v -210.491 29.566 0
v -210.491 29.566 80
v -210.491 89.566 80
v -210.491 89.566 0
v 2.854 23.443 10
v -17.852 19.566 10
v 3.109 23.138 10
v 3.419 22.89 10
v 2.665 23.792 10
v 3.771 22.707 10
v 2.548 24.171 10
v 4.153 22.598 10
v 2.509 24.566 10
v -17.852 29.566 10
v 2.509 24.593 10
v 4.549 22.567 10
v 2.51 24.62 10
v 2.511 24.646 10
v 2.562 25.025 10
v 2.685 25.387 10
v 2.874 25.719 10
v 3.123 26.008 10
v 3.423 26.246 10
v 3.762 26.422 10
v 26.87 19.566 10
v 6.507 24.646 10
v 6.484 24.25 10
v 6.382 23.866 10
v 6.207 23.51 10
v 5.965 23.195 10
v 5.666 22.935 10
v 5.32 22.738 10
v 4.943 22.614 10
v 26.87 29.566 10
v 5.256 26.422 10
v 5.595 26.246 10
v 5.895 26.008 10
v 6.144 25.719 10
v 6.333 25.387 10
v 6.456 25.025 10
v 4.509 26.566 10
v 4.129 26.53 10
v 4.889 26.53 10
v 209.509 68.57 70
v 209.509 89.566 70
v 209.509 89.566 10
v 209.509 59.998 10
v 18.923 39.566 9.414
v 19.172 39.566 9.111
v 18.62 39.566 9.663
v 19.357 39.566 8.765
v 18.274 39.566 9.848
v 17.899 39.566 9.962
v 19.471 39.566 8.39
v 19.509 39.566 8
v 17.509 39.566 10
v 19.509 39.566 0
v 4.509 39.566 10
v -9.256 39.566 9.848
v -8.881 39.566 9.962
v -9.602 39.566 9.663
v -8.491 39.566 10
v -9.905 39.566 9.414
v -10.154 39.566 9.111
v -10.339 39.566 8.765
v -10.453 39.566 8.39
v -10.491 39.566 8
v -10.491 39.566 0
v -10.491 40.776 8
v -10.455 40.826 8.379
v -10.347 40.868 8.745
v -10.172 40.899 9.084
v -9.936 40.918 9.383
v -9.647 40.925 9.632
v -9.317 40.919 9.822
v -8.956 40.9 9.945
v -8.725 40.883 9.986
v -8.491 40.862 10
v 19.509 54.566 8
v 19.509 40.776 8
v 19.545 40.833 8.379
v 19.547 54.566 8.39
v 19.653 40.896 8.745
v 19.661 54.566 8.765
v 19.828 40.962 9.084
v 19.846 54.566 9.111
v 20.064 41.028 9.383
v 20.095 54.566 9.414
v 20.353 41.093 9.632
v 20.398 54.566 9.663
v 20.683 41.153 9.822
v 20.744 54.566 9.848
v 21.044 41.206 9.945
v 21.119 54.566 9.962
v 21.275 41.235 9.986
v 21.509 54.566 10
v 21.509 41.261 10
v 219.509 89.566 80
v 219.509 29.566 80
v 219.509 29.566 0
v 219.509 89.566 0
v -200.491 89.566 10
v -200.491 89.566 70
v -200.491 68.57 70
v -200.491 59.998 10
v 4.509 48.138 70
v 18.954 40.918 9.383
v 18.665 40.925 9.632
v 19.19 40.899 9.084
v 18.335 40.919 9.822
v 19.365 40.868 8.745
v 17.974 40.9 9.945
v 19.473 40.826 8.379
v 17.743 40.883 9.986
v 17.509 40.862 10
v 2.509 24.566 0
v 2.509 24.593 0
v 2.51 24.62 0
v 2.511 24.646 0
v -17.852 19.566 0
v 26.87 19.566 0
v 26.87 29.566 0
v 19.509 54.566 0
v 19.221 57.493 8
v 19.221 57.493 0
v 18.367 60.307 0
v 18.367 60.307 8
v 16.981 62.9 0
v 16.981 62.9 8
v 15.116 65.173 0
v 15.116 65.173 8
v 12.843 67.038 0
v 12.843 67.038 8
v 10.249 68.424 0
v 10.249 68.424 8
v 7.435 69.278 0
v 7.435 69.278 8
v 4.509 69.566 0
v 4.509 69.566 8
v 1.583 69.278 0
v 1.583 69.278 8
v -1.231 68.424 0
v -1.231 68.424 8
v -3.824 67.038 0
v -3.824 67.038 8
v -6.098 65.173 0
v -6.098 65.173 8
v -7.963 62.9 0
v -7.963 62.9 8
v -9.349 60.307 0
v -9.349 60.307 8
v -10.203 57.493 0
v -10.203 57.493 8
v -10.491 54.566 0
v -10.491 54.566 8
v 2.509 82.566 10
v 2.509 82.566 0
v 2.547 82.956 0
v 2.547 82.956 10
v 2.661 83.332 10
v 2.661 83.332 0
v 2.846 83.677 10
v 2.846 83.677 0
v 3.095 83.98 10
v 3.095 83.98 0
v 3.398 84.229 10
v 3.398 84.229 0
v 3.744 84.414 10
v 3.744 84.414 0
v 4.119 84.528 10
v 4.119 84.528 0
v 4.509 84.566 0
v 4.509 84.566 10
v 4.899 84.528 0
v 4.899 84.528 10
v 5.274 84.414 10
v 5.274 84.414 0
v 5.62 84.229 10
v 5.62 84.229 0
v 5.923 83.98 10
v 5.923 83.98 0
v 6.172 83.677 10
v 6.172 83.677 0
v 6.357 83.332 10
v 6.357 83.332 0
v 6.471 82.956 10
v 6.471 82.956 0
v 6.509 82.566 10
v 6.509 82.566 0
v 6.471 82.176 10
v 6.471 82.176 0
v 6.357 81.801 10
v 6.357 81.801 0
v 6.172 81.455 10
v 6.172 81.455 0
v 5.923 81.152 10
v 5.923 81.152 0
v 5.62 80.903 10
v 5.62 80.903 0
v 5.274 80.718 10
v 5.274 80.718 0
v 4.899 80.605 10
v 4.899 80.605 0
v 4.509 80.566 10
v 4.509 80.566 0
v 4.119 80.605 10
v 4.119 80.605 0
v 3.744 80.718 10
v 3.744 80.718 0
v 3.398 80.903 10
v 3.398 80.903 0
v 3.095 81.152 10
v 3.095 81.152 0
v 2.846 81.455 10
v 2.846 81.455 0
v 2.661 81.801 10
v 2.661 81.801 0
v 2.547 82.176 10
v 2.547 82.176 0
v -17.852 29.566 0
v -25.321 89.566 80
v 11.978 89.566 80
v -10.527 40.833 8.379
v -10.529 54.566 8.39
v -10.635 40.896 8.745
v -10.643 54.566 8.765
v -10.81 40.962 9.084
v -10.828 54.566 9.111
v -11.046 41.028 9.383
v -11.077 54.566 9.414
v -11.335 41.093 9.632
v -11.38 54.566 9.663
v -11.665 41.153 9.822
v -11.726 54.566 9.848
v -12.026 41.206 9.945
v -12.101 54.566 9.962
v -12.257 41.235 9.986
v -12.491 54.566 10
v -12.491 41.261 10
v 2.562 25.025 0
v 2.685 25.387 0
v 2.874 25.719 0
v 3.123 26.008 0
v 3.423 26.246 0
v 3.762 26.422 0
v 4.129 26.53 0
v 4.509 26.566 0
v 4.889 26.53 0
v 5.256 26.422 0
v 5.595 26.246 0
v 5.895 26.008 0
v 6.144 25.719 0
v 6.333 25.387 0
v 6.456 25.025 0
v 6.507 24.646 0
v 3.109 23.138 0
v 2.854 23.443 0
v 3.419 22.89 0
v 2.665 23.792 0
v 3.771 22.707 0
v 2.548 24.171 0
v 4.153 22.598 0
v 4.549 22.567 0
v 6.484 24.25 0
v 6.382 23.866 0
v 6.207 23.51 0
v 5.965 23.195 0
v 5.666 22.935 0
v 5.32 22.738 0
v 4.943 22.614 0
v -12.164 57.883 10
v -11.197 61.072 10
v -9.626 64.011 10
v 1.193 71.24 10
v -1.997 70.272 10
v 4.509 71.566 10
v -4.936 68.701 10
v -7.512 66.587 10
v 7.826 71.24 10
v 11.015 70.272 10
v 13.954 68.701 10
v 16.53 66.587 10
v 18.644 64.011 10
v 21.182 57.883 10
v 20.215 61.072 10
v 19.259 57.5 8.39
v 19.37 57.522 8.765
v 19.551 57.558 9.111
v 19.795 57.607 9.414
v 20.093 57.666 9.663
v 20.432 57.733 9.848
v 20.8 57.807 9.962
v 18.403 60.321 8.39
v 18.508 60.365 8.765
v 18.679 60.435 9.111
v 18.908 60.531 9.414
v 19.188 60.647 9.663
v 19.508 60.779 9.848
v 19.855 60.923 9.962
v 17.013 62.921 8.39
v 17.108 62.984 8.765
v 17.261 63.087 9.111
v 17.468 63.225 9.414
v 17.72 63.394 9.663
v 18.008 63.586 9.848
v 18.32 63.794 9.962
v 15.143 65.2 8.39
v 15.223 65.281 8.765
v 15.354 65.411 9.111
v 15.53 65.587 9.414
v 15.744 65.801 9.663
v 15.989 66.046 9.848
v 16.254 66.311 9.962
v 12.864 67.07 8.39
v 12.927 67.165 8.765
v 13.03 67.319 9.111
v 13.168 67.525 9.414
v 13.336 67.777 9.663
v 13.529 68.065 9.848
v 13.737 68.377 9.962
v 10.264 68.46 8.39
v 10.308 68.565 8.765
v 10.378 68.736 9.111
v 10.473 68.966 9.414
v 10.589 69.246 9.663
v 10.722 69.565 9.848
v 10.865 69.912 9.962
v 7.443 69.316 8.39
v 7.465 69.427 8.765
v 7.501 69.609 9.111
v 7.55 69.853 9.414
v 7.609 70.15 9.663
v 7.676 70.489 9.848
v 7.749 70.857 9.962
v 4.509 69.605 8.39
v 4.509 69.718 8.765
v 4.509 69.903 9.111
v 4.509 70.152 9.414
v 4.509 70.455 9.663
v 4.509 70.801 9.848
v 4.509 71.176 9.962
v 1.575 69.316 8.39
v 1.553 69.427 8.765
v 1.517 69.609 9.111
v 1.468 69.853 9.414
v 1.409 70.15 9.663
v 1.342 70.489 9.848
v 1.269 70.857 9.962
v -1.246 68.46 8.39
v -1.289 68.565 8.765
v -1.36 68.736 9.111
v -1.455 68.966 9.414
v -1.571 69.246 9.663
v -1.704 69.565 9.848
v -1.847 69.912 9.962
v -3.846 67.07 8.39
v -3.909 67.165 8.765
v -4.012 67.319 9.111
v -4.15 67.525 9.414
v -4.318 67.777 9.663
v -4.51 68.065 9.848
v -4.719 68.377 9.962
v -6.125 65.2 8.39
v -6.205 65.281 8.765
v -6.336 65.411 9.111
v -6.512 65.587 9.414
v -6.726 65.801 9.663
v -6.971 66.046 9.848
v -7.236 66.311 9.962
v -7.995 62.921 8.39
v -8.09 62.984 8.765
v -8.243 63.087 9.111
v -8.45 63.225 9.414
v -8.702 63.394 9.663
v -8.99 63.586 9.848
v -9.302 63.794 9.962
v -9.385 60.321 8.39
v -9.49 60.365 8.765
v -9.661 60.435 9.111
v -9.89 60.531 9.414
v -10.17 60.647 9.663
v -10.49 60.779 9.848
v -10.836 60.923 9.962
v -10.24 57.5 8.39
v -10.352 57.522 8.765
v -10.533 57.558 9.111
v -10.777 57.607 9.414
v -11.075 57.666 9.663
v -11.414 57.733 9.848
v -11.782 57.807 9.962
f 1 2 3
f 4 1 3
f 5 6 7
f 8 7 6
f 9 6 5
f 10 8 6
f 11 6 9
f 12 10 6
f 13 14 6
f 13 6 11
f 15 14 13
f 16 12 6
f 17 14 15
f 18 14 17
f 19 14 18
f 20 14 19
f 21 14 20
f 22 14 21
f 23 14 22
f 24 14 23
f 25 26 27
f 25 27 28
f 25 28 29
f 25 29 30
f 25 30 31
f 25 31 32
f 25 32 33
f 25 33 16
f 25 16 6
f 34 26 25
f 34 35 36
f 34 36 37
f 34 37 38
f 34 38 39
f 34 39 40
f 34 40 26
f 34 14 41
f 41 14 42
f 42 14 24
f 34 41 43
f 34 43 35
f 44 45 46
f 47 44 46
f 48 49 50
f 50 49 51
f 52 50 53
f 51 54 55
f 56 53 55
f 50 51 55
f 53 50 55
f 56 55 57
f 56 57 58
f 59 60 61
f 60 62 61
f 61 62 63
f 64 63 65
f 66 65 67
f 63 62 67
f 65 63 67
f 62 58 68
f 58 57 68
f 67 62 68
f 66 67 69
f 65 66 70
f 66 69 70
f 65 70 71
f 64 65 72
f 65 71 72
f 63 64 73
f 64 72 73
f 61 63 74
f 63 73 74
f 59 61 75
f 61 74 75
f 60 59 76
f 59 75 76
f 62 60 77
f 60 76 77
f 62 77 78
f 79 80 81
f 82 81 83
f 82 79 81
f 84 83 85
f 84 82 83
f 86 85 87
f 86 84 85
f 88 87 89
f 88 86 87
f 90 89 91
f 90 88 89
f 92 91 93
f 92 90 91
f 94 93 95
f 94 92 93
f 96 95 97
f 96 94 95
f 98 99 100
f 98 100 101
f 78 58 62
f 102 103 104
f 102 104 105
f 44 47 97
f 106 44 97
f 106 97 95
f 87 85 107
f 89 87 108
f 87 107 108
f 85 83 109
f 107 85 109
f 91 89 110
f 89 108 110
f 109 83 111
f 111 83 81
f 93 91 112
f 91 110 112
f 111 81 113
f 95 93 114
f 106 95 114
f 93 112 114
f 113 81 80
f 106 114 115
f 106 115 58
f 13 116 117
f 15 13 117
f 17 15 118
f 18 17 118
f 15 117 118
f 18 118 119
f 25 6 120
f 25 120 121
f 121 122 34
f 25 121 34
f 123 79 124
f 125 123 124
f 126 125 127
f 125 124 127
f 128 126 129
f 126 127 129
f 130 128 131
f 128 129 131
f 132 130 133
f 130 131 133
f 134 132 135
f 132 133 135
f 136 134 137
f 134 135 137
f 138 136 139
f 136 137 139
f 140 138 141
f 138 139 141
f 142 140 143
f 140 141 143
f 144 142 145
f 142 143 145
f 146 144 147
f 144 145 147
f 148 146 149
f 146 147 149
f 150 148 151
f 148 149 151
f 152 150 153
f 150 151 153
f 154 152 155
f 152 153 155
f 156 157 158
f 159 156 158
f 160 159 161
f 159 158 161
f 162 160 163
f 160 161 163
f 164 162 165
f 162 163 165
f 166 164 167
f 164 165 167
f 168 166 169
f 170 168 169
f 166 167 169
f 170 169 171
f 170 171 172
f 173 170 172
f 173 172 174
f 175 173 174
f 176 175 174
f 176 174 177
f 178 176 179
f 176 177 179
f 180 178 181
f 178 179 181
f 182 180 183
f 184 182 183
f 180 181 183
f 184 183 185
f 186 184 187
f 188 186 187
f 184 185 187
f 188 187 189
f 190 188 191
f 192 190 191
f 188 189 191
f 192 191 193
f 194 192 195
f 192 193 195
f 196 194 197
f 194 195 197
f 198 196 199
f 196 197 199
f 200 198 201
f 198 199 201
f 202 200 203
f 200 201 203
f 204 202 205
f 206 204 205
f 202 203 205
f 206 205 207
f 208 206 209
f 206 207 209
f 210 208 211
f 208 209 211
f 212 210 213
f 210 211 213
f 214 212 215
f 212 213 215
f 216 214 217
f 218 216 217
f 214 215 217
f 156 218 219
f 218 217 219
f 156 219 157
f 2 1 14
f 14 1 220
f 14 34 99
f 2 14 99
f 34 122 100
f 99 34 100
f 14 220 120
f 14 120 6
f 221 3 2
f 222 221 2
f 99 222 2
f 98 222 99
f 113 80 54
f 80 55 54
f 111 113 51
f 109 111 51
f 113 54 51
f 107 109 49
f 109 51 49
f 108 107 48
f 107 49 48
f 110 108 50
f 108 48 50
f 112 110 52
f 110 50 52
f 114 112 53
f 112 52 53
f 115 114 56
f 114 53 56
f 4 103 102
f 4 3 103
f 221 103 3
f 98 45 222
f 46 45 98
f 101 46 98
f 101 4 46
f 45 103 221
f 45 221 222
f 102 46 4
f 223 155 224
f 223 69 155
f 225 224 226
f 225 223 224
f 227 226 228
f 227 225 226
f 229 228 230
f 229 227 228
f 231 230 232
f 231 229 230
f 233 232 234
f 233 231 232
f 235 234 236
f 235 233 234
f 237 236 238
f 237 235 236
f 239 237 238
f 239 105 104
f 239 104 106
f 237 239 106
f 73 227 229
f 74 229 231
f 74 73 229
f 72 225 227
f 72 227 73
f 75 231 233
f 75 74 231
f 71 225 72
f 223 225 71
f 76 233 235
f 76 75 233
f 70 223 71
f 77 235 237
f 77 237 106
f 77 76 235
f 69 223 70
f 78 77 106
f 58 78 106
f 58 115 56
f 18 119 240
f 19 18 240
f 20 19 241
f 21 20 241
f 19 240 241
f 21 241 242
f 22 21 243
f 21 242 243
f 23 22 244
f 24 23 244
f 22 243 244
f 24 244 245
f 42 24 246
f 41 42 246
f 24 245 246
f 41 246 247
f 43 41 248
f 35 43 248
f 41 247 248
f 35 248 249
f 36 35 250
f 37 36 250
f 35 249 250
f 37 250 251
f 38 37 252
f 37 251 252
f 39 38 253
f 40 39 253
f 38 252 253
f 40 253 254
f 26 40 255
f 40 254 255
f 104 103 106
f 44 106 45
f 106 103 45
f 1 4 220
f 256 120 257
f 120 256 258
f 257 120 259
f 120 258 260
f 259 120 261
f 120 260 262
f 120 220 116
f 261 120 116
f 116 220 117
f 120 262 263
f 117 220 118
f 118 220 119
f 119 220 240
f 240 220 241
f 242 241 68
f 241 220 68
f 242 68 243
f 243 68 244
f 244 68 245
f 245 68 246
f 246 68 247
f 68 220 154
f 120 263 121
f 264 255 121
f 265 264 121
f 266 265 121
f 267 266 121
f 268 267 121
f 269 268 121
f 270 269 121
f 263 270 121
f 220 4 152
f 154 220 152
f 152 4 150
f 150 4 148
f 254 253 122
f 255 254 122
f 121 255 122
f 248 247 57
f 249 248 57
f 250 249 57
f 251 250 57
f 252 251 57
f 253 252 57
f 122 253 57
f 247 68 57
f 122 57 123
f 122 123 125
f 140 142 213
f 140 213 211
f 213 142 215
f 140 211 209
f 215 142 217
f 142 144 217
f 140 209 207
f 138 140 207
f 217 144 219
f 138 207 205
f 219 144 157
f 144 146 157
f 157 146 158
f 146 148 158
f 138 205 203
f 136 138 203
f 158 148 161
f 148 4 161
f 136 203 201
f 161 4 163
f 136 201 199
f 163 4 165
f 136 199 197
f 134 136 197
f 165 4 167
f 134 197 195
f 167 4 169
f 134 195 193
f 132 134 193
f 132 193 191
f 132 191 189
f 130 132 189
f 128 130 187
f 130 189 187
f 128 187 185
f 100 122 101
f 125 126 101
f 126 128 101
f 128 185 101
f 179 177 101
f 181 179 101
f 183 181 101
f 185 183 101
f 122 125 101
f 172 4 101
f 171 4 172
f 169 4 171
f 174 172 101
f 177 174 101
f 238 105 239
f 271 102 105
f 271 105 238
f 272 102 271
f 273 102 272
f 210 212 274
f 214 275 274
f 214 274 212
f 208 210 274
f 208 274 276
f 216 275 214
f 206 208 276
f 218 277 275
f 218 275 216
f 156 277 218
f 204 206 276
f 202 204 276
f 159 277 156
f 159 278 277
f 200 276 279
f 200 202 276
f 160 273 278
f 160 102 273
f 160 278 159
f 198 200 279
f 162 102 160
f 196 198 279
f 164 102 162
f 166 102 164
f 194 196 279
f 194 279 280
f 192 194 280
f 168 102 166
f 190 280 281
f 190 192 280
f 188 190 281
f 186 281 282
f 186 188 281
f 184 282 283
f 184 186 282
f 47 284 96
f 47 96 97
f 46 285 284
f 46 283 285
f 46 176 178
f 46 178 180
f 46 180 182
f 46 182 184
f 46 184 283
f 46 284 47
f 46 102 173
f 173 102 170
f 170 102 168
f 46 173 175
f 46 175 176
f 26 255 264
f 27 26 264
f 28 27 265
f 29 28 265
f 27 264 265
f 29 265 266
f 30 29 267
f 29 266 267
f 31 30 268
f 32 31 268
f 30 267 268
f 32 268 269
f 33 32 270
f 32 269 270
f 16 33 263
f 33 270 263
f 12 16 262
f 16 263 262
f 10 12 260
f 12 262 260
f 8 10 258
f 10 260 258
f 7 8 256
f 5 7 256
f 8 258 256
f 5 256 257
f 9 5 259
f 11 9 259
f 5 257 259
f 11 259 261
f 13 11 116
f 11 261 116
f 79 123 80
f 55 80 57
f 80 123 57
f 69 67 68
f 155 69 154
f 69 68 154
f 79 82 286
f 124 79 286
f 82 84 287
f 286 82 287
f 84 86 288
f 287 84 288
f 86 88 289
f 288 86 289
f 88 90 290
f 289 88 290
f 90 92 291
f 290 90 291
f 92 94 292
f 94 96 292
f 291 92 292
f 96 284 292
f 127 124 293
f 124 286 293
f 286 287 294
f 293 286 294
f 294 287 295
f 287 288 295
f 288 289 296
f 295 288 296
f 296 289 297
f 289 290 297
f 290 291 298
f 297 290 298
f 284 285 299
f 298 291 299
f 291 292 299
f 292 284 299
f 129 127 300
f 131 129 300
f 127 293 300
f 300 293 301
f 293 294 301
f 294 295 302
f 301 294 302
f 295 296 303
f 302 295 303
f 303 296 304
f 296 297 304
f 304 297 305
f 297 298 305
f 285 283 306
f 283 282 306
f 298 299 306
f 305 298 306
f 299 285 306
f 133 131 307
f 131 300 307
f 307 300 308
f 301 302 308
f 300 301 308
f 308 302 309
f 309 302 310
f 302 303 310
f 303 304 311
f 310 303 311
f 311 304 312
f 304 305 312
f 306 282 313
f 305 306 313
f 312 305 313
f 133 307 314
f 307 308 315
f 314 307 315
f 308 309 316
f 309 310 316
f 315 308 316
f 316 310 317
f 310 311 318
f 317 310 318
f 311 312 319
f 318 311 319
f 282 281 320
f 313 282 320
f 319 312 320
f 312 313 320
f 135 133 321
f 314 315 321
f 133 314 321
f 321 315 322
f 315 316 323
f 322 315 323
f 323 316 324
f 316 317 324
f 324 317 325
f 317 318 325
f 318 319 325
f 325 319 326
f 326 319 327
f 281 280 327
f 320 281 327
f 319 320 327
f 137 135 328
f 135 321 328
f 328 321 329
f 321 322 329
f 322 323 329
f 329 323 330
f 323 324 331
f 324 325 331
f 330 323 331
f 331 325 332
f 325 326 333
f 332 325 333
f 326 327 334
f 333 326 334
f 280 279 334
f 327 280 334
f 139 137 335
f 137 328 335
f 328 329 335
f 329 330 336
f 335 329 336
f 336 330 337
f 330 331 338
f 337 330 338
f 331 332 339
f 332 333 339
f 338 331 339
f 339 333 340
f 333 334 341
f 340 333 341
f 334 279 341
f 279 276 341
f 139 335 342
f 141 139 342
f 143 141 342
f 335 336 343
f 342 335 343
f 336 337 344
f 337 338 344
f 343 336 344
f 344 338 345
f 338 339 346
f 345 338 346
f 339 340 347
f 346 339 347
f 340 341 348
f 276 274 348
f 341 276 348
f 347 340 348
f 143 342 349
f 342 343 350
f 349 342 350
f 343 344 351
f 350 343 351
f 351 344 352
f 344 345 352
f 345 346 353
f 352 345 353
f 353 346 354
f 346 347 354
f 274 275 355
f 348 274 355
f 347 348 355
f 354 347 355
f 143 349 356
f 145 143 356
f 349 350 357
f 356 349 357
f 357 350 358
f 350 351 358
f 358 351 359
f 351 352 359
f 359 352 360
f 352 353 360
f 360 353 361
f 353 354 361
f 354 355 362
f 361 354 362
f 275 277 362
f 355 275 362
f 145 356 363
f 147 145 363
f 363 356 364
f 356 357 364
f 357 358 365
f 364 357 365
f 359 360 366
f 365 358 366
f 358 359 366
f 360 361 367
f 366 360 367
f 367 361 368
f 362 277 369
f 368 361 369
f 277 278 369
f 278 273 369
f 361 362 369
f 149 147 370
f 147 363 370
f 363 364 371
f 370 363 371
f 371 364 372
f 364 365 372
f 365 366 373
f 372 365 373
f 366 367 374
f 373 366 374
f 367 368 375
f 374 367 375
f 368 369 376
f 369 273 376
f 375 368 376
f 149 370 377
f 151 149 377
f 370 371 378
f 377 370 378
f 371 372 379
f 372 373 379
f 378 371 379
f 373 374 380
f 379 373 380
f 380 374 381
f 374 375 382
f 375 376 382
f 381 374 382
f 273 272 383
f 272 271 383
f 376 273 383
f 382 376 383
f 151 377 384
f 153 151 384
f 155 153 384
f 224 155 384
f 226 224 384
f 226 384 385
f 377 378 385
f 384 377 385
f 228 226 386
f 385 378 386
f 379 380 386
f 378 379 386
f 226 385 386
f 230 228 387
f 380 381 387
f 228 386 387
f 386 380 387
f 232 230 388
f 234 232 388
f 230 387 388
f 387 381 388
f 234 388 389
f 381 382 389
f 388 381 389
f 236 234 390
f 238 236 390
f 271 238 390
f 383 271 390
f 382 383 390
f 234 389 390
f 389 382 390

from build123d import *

# Parameters (mm, degrees)
ESQUISSE2_W              = 430
ESQUISSE2_H              = 60
BOSS_EXTRU_1_DEPTH       = 80
ESQUISSE3_W              = 410
ESQUISSE3_H              = 60
ENL_V_MAT_EXTRU_2_DEPTH  = 50
BOSS_EXTRU_3_DEPTH       = 60
BOSS_EXTRU_4_DEPTH       = 20
ESQUISSE12_W             = 37.299463168
ESQUISSE12_H             = 2.901511437
ENL_V_MAT_EXTRU_3_DEPTH  = 80
ESQUISSE14_W             = 217.702790891
ESQUISSE14_H             = 66.731599488
ENL_V_MAT_EXTRU_4_DEPTH  = 80
ESQUISSE16_W             = 132.026208669
ESQUISSE16_H             = 23.789258621
ENL_V_MAT_EXTRU_5_DEPTH  = 80
ESQUISSE17_W             = 231.982221262
ESQUISSE17_H             = 63.124798286
ENL_V_MAT_EXTRU_6_DEPTH  = 80
ESQUISSE18_R             = 15
ENL_V_MAT_EXTRU_7_DEPTH  = 80
ENL_V_MAT_EXTRU_8_DEPTH  = 10
CONG_3_R                 = 2
CONG_4_R                 = 2
ESQUISSE26_W             = 44.72135955
ESQUISSE26_H             = 10
BOSS_EXTRU_5_DEPTH       = 10
ENL_V_MAT_EXTRU_9_DEPTH  = 10
ESQUISSE27_R             = 2
ENL_V_MAT_EXTRU_11_DEPTH = 10


with BuildPart() as part:
    # Esquisse2 → Boss.-Extru.1 (new body)
    with BuildSketch(Plane.XY):
        with Locations((4.509056244, 59.566253575)):
            Rectangle(ESQUISSE2_W, ESQUISSE2_H)
    extrude(amount=BOSS_EXTRU_1_DEPTH)

    # Esquisse3 → Enlèv. mat.-Extru.2 (cut)
    with BuildSketch(Plane(origin=(0, 89.566253575, 0), x_dir=(1, 0, 0), z_dir=(0, 1, 0))):
        with Locations((4.509056244, -40)):
            Rectangle(ESQUISSE3_W, ESQUISSE3_H)
    extrude(amount=-ENL_V_MAT_EXTRU_2_DEPTH, mode=Mode.SUBTRACT)

    # Esquisse5 → Boss.-Extru.3 (add)
    with BuildSketch(Plane.XY.offset(10)):
        Polygon((-200.490943756, 59.566253575), (-200.490943756, 39.566253575), (4.509056244, 39.566253575), align=None)
        Polygon((209.509056244, 59.566253575), (4.509056244, 39.566253575), (209.509056244, 39.566253575), align=None)
    extrude(amount=BOSS_EXTRU_3_DEPTH)

    # Esquisse11 → Boss.-Extru.4 (add)
    with BuildSketch(Plane(origin=(3.732634391, 37.450765056, -5.350109294), x_dir=(0.995167757, -0.097202432, 0.013886062), z_dir=(0.098189284, 0.985165817, -0.140737974))):
        Polygon((0.78019193, -15.495008178), (-209.853755734, -12.986939636), (-207.594167279, -81.787183383), (2.874639564, -83.936671883), align=None)
    boss_extru_4 = extrude(amount=-BOSS_EXTRU_4_DEPTH)

    # Esquisse12 → Enlèv. mat.-Extru.3 (cut)
    with BuildSketch(Plane(origin=(0, 89.566253575, 0), x_dir=(1, 0, 0), z_dir=(0, 1, 0))):
        with Locations((-6.67152918, -81.450755719)):
            Rectangle(ESQUISSE12_W, ESQUISSE12_H)
    extrude(amount=-ENL_V_MAT_EXTRU_3_DEPTH, mode=Mode.SUBTRACT)

    # Esquisse14 → Enlèv. mat.-Extru.4 (cut)
    with BuildSketch(Plane.XY.offset(80)):
        with Locations((-32.350917278, -3.799546169)):
            Rectangle(ESQUISSE14_W, ESQUISSE14_H)
    extrude(amount=-ENL_V_MAT_EXTRU_4_DEPTH, mode=Mode.SUBTRACT)

    # Symétrie3: Boss.-Extru.4 across plane
    add(boss_extru_4.mirror(Plane(origin=(4.509056244, 0, 0), x_dir=(0, 0, 1), z_dir=(1, 0, 0))))

    # Esquisse16 → Enlèv. mat.-Extru.5 (cut)
    with BuildSketch(Plane(origin=(0, 89.566253575, 0), x_dir=(1, 0, 0), z_dir=(0, 1, 0))):
        with Locations((17.978222552, -91.89462931)):
            Rectangle(ESQUISSE16_W, ESQUISSE16_H)
    extrude(amount=-ENL_V_MAT_EXTRU_5_DEPTH, mode=Mode.SUBTRACT)

    # Esquisse17 → Enlèv. mat.-Extru.6 (cut)
    with BuildSketch(Plane.XY.offset(80)):
        with Locations((69.126673961, -1.996145568)):
            Rectangle(ESQUISSE17_W, ESQUISSE17_H)
    extrude(amount=-ENL_V_MAT_EXTRU_6_DEPTH, mode=Mode.SUBTRACT)

    # Esquisse18 → Enlèv. mat.-Extru.7 (cut)
    with BuildSketch(Plane.XY.offset(10)):
        with Locations((4.509056244, 54.566253575)):
            Circle(ESQUISSE18_R)
    extrude(amount=-ENL_V_MAT_EXTRU_7_DEPTH, mode=Mode.SUBTRACT)

    # Esquisse20 → Enlèv. mat.-Extru.8 (cut)
    with BuildSketch(Plane(origin=(0, 0, 0), x_dir=(-1, 0, 0), z_dir=(0, 0, -1))):
        Polygon((-19.509056244, 54.566253575), (-19.509056244, 39.566253575), (-4.509056244, 39.566253575), (10.490943756, 39.566253575), (10.490943756, 54.566253575), align=None)
    extrude(amount=-ENL_V_MAT_EXTRU_8_DEPTH, mode=Mode.SUBTRACT)

    # Congé3
    cong_3_edges = [part.edges().sort_by_distance(p)[0] for p in [
        (4.509056244, 69.566253575, 10),
        (-10.490943756, 47.81376188, 10),
        (19.509056244, 47.81376188, 10),
    ]]
    fillet(cong_3_edges, radius=CONG_3_R)

    # Congé4
    cong_4_edges = [part.edges().sort_by_distance(p)[0] for p in [
        (19.509056244, 40.31376188, 10),
        (-10.490943756, 40.31376188, 10),
    ]]
    fillet(cong_4_edges, radius=CONG_4_R)

    # Esquisse26 → Boss.-Extru.5 (add)
    with BuildSketch(Plane.XZ.offset(-29.566253575)):
        with Locations((4.509056244, 5)):
            Rectangle(ESQUISSE26_W, ESQUISSE26_H)
    extrude(amount=BOSS_EXTRU_5_DEPTH)

    # Esquisse24 → Enlèv. mat.-Extru.9 (cut)
    with BuildSketch(Plane(origin=(0, 0, 0), x_dir=(-1, 0, 0), z_dir=(0, 0, -1))):
        with BuildLine():
            ThreePointArc((-2.510656885, 24.646253575), (-4.509056244, 26.566253575), (-6.507455604, 24.646253575))
            ThreePointArc((-6.507455604, 24.646253575), (-4.509056244, 24.566253575), (-2.510656885, 24.646253575))
        make_face()
        with BuildLine():
            ThreePointArc((-2.510656885, 24.646253575), (-4.509056244, 24.566253575), (-6.507455604, 24.646253575))
            ThreePointArc((-6.507455604, 24.646253575), (-4.54906425, 22.566653775), (-2.509056244, 24.566253575))
            ThreePointArc((-2.509056244, 24.566253575), (-2.509456444, 24.60626158), (-2.510656885, 24.646253575))
        make_face()
    extrude(amount=-ENL_V_MAT_EXTRU_9_DEPTH, mode=Mode.SUBTRACT)

    # Esquisse27 → Enlèv. mat.-Extru.11 (cut)
    with BuildSketch(Plane(origin=(0, 0, 0), x_dir=(-1, 0, 0), z_dir=(0, 0, -1))):
        with Locations((-4.509056244, 82.566253575)):
            Circle(ESQUISSE27_R)
    extrude(amount=-ENL_V_MAT_EXTRU_11_DEPTH, mode=Mode.SUBTRACT)


solid = part.part
